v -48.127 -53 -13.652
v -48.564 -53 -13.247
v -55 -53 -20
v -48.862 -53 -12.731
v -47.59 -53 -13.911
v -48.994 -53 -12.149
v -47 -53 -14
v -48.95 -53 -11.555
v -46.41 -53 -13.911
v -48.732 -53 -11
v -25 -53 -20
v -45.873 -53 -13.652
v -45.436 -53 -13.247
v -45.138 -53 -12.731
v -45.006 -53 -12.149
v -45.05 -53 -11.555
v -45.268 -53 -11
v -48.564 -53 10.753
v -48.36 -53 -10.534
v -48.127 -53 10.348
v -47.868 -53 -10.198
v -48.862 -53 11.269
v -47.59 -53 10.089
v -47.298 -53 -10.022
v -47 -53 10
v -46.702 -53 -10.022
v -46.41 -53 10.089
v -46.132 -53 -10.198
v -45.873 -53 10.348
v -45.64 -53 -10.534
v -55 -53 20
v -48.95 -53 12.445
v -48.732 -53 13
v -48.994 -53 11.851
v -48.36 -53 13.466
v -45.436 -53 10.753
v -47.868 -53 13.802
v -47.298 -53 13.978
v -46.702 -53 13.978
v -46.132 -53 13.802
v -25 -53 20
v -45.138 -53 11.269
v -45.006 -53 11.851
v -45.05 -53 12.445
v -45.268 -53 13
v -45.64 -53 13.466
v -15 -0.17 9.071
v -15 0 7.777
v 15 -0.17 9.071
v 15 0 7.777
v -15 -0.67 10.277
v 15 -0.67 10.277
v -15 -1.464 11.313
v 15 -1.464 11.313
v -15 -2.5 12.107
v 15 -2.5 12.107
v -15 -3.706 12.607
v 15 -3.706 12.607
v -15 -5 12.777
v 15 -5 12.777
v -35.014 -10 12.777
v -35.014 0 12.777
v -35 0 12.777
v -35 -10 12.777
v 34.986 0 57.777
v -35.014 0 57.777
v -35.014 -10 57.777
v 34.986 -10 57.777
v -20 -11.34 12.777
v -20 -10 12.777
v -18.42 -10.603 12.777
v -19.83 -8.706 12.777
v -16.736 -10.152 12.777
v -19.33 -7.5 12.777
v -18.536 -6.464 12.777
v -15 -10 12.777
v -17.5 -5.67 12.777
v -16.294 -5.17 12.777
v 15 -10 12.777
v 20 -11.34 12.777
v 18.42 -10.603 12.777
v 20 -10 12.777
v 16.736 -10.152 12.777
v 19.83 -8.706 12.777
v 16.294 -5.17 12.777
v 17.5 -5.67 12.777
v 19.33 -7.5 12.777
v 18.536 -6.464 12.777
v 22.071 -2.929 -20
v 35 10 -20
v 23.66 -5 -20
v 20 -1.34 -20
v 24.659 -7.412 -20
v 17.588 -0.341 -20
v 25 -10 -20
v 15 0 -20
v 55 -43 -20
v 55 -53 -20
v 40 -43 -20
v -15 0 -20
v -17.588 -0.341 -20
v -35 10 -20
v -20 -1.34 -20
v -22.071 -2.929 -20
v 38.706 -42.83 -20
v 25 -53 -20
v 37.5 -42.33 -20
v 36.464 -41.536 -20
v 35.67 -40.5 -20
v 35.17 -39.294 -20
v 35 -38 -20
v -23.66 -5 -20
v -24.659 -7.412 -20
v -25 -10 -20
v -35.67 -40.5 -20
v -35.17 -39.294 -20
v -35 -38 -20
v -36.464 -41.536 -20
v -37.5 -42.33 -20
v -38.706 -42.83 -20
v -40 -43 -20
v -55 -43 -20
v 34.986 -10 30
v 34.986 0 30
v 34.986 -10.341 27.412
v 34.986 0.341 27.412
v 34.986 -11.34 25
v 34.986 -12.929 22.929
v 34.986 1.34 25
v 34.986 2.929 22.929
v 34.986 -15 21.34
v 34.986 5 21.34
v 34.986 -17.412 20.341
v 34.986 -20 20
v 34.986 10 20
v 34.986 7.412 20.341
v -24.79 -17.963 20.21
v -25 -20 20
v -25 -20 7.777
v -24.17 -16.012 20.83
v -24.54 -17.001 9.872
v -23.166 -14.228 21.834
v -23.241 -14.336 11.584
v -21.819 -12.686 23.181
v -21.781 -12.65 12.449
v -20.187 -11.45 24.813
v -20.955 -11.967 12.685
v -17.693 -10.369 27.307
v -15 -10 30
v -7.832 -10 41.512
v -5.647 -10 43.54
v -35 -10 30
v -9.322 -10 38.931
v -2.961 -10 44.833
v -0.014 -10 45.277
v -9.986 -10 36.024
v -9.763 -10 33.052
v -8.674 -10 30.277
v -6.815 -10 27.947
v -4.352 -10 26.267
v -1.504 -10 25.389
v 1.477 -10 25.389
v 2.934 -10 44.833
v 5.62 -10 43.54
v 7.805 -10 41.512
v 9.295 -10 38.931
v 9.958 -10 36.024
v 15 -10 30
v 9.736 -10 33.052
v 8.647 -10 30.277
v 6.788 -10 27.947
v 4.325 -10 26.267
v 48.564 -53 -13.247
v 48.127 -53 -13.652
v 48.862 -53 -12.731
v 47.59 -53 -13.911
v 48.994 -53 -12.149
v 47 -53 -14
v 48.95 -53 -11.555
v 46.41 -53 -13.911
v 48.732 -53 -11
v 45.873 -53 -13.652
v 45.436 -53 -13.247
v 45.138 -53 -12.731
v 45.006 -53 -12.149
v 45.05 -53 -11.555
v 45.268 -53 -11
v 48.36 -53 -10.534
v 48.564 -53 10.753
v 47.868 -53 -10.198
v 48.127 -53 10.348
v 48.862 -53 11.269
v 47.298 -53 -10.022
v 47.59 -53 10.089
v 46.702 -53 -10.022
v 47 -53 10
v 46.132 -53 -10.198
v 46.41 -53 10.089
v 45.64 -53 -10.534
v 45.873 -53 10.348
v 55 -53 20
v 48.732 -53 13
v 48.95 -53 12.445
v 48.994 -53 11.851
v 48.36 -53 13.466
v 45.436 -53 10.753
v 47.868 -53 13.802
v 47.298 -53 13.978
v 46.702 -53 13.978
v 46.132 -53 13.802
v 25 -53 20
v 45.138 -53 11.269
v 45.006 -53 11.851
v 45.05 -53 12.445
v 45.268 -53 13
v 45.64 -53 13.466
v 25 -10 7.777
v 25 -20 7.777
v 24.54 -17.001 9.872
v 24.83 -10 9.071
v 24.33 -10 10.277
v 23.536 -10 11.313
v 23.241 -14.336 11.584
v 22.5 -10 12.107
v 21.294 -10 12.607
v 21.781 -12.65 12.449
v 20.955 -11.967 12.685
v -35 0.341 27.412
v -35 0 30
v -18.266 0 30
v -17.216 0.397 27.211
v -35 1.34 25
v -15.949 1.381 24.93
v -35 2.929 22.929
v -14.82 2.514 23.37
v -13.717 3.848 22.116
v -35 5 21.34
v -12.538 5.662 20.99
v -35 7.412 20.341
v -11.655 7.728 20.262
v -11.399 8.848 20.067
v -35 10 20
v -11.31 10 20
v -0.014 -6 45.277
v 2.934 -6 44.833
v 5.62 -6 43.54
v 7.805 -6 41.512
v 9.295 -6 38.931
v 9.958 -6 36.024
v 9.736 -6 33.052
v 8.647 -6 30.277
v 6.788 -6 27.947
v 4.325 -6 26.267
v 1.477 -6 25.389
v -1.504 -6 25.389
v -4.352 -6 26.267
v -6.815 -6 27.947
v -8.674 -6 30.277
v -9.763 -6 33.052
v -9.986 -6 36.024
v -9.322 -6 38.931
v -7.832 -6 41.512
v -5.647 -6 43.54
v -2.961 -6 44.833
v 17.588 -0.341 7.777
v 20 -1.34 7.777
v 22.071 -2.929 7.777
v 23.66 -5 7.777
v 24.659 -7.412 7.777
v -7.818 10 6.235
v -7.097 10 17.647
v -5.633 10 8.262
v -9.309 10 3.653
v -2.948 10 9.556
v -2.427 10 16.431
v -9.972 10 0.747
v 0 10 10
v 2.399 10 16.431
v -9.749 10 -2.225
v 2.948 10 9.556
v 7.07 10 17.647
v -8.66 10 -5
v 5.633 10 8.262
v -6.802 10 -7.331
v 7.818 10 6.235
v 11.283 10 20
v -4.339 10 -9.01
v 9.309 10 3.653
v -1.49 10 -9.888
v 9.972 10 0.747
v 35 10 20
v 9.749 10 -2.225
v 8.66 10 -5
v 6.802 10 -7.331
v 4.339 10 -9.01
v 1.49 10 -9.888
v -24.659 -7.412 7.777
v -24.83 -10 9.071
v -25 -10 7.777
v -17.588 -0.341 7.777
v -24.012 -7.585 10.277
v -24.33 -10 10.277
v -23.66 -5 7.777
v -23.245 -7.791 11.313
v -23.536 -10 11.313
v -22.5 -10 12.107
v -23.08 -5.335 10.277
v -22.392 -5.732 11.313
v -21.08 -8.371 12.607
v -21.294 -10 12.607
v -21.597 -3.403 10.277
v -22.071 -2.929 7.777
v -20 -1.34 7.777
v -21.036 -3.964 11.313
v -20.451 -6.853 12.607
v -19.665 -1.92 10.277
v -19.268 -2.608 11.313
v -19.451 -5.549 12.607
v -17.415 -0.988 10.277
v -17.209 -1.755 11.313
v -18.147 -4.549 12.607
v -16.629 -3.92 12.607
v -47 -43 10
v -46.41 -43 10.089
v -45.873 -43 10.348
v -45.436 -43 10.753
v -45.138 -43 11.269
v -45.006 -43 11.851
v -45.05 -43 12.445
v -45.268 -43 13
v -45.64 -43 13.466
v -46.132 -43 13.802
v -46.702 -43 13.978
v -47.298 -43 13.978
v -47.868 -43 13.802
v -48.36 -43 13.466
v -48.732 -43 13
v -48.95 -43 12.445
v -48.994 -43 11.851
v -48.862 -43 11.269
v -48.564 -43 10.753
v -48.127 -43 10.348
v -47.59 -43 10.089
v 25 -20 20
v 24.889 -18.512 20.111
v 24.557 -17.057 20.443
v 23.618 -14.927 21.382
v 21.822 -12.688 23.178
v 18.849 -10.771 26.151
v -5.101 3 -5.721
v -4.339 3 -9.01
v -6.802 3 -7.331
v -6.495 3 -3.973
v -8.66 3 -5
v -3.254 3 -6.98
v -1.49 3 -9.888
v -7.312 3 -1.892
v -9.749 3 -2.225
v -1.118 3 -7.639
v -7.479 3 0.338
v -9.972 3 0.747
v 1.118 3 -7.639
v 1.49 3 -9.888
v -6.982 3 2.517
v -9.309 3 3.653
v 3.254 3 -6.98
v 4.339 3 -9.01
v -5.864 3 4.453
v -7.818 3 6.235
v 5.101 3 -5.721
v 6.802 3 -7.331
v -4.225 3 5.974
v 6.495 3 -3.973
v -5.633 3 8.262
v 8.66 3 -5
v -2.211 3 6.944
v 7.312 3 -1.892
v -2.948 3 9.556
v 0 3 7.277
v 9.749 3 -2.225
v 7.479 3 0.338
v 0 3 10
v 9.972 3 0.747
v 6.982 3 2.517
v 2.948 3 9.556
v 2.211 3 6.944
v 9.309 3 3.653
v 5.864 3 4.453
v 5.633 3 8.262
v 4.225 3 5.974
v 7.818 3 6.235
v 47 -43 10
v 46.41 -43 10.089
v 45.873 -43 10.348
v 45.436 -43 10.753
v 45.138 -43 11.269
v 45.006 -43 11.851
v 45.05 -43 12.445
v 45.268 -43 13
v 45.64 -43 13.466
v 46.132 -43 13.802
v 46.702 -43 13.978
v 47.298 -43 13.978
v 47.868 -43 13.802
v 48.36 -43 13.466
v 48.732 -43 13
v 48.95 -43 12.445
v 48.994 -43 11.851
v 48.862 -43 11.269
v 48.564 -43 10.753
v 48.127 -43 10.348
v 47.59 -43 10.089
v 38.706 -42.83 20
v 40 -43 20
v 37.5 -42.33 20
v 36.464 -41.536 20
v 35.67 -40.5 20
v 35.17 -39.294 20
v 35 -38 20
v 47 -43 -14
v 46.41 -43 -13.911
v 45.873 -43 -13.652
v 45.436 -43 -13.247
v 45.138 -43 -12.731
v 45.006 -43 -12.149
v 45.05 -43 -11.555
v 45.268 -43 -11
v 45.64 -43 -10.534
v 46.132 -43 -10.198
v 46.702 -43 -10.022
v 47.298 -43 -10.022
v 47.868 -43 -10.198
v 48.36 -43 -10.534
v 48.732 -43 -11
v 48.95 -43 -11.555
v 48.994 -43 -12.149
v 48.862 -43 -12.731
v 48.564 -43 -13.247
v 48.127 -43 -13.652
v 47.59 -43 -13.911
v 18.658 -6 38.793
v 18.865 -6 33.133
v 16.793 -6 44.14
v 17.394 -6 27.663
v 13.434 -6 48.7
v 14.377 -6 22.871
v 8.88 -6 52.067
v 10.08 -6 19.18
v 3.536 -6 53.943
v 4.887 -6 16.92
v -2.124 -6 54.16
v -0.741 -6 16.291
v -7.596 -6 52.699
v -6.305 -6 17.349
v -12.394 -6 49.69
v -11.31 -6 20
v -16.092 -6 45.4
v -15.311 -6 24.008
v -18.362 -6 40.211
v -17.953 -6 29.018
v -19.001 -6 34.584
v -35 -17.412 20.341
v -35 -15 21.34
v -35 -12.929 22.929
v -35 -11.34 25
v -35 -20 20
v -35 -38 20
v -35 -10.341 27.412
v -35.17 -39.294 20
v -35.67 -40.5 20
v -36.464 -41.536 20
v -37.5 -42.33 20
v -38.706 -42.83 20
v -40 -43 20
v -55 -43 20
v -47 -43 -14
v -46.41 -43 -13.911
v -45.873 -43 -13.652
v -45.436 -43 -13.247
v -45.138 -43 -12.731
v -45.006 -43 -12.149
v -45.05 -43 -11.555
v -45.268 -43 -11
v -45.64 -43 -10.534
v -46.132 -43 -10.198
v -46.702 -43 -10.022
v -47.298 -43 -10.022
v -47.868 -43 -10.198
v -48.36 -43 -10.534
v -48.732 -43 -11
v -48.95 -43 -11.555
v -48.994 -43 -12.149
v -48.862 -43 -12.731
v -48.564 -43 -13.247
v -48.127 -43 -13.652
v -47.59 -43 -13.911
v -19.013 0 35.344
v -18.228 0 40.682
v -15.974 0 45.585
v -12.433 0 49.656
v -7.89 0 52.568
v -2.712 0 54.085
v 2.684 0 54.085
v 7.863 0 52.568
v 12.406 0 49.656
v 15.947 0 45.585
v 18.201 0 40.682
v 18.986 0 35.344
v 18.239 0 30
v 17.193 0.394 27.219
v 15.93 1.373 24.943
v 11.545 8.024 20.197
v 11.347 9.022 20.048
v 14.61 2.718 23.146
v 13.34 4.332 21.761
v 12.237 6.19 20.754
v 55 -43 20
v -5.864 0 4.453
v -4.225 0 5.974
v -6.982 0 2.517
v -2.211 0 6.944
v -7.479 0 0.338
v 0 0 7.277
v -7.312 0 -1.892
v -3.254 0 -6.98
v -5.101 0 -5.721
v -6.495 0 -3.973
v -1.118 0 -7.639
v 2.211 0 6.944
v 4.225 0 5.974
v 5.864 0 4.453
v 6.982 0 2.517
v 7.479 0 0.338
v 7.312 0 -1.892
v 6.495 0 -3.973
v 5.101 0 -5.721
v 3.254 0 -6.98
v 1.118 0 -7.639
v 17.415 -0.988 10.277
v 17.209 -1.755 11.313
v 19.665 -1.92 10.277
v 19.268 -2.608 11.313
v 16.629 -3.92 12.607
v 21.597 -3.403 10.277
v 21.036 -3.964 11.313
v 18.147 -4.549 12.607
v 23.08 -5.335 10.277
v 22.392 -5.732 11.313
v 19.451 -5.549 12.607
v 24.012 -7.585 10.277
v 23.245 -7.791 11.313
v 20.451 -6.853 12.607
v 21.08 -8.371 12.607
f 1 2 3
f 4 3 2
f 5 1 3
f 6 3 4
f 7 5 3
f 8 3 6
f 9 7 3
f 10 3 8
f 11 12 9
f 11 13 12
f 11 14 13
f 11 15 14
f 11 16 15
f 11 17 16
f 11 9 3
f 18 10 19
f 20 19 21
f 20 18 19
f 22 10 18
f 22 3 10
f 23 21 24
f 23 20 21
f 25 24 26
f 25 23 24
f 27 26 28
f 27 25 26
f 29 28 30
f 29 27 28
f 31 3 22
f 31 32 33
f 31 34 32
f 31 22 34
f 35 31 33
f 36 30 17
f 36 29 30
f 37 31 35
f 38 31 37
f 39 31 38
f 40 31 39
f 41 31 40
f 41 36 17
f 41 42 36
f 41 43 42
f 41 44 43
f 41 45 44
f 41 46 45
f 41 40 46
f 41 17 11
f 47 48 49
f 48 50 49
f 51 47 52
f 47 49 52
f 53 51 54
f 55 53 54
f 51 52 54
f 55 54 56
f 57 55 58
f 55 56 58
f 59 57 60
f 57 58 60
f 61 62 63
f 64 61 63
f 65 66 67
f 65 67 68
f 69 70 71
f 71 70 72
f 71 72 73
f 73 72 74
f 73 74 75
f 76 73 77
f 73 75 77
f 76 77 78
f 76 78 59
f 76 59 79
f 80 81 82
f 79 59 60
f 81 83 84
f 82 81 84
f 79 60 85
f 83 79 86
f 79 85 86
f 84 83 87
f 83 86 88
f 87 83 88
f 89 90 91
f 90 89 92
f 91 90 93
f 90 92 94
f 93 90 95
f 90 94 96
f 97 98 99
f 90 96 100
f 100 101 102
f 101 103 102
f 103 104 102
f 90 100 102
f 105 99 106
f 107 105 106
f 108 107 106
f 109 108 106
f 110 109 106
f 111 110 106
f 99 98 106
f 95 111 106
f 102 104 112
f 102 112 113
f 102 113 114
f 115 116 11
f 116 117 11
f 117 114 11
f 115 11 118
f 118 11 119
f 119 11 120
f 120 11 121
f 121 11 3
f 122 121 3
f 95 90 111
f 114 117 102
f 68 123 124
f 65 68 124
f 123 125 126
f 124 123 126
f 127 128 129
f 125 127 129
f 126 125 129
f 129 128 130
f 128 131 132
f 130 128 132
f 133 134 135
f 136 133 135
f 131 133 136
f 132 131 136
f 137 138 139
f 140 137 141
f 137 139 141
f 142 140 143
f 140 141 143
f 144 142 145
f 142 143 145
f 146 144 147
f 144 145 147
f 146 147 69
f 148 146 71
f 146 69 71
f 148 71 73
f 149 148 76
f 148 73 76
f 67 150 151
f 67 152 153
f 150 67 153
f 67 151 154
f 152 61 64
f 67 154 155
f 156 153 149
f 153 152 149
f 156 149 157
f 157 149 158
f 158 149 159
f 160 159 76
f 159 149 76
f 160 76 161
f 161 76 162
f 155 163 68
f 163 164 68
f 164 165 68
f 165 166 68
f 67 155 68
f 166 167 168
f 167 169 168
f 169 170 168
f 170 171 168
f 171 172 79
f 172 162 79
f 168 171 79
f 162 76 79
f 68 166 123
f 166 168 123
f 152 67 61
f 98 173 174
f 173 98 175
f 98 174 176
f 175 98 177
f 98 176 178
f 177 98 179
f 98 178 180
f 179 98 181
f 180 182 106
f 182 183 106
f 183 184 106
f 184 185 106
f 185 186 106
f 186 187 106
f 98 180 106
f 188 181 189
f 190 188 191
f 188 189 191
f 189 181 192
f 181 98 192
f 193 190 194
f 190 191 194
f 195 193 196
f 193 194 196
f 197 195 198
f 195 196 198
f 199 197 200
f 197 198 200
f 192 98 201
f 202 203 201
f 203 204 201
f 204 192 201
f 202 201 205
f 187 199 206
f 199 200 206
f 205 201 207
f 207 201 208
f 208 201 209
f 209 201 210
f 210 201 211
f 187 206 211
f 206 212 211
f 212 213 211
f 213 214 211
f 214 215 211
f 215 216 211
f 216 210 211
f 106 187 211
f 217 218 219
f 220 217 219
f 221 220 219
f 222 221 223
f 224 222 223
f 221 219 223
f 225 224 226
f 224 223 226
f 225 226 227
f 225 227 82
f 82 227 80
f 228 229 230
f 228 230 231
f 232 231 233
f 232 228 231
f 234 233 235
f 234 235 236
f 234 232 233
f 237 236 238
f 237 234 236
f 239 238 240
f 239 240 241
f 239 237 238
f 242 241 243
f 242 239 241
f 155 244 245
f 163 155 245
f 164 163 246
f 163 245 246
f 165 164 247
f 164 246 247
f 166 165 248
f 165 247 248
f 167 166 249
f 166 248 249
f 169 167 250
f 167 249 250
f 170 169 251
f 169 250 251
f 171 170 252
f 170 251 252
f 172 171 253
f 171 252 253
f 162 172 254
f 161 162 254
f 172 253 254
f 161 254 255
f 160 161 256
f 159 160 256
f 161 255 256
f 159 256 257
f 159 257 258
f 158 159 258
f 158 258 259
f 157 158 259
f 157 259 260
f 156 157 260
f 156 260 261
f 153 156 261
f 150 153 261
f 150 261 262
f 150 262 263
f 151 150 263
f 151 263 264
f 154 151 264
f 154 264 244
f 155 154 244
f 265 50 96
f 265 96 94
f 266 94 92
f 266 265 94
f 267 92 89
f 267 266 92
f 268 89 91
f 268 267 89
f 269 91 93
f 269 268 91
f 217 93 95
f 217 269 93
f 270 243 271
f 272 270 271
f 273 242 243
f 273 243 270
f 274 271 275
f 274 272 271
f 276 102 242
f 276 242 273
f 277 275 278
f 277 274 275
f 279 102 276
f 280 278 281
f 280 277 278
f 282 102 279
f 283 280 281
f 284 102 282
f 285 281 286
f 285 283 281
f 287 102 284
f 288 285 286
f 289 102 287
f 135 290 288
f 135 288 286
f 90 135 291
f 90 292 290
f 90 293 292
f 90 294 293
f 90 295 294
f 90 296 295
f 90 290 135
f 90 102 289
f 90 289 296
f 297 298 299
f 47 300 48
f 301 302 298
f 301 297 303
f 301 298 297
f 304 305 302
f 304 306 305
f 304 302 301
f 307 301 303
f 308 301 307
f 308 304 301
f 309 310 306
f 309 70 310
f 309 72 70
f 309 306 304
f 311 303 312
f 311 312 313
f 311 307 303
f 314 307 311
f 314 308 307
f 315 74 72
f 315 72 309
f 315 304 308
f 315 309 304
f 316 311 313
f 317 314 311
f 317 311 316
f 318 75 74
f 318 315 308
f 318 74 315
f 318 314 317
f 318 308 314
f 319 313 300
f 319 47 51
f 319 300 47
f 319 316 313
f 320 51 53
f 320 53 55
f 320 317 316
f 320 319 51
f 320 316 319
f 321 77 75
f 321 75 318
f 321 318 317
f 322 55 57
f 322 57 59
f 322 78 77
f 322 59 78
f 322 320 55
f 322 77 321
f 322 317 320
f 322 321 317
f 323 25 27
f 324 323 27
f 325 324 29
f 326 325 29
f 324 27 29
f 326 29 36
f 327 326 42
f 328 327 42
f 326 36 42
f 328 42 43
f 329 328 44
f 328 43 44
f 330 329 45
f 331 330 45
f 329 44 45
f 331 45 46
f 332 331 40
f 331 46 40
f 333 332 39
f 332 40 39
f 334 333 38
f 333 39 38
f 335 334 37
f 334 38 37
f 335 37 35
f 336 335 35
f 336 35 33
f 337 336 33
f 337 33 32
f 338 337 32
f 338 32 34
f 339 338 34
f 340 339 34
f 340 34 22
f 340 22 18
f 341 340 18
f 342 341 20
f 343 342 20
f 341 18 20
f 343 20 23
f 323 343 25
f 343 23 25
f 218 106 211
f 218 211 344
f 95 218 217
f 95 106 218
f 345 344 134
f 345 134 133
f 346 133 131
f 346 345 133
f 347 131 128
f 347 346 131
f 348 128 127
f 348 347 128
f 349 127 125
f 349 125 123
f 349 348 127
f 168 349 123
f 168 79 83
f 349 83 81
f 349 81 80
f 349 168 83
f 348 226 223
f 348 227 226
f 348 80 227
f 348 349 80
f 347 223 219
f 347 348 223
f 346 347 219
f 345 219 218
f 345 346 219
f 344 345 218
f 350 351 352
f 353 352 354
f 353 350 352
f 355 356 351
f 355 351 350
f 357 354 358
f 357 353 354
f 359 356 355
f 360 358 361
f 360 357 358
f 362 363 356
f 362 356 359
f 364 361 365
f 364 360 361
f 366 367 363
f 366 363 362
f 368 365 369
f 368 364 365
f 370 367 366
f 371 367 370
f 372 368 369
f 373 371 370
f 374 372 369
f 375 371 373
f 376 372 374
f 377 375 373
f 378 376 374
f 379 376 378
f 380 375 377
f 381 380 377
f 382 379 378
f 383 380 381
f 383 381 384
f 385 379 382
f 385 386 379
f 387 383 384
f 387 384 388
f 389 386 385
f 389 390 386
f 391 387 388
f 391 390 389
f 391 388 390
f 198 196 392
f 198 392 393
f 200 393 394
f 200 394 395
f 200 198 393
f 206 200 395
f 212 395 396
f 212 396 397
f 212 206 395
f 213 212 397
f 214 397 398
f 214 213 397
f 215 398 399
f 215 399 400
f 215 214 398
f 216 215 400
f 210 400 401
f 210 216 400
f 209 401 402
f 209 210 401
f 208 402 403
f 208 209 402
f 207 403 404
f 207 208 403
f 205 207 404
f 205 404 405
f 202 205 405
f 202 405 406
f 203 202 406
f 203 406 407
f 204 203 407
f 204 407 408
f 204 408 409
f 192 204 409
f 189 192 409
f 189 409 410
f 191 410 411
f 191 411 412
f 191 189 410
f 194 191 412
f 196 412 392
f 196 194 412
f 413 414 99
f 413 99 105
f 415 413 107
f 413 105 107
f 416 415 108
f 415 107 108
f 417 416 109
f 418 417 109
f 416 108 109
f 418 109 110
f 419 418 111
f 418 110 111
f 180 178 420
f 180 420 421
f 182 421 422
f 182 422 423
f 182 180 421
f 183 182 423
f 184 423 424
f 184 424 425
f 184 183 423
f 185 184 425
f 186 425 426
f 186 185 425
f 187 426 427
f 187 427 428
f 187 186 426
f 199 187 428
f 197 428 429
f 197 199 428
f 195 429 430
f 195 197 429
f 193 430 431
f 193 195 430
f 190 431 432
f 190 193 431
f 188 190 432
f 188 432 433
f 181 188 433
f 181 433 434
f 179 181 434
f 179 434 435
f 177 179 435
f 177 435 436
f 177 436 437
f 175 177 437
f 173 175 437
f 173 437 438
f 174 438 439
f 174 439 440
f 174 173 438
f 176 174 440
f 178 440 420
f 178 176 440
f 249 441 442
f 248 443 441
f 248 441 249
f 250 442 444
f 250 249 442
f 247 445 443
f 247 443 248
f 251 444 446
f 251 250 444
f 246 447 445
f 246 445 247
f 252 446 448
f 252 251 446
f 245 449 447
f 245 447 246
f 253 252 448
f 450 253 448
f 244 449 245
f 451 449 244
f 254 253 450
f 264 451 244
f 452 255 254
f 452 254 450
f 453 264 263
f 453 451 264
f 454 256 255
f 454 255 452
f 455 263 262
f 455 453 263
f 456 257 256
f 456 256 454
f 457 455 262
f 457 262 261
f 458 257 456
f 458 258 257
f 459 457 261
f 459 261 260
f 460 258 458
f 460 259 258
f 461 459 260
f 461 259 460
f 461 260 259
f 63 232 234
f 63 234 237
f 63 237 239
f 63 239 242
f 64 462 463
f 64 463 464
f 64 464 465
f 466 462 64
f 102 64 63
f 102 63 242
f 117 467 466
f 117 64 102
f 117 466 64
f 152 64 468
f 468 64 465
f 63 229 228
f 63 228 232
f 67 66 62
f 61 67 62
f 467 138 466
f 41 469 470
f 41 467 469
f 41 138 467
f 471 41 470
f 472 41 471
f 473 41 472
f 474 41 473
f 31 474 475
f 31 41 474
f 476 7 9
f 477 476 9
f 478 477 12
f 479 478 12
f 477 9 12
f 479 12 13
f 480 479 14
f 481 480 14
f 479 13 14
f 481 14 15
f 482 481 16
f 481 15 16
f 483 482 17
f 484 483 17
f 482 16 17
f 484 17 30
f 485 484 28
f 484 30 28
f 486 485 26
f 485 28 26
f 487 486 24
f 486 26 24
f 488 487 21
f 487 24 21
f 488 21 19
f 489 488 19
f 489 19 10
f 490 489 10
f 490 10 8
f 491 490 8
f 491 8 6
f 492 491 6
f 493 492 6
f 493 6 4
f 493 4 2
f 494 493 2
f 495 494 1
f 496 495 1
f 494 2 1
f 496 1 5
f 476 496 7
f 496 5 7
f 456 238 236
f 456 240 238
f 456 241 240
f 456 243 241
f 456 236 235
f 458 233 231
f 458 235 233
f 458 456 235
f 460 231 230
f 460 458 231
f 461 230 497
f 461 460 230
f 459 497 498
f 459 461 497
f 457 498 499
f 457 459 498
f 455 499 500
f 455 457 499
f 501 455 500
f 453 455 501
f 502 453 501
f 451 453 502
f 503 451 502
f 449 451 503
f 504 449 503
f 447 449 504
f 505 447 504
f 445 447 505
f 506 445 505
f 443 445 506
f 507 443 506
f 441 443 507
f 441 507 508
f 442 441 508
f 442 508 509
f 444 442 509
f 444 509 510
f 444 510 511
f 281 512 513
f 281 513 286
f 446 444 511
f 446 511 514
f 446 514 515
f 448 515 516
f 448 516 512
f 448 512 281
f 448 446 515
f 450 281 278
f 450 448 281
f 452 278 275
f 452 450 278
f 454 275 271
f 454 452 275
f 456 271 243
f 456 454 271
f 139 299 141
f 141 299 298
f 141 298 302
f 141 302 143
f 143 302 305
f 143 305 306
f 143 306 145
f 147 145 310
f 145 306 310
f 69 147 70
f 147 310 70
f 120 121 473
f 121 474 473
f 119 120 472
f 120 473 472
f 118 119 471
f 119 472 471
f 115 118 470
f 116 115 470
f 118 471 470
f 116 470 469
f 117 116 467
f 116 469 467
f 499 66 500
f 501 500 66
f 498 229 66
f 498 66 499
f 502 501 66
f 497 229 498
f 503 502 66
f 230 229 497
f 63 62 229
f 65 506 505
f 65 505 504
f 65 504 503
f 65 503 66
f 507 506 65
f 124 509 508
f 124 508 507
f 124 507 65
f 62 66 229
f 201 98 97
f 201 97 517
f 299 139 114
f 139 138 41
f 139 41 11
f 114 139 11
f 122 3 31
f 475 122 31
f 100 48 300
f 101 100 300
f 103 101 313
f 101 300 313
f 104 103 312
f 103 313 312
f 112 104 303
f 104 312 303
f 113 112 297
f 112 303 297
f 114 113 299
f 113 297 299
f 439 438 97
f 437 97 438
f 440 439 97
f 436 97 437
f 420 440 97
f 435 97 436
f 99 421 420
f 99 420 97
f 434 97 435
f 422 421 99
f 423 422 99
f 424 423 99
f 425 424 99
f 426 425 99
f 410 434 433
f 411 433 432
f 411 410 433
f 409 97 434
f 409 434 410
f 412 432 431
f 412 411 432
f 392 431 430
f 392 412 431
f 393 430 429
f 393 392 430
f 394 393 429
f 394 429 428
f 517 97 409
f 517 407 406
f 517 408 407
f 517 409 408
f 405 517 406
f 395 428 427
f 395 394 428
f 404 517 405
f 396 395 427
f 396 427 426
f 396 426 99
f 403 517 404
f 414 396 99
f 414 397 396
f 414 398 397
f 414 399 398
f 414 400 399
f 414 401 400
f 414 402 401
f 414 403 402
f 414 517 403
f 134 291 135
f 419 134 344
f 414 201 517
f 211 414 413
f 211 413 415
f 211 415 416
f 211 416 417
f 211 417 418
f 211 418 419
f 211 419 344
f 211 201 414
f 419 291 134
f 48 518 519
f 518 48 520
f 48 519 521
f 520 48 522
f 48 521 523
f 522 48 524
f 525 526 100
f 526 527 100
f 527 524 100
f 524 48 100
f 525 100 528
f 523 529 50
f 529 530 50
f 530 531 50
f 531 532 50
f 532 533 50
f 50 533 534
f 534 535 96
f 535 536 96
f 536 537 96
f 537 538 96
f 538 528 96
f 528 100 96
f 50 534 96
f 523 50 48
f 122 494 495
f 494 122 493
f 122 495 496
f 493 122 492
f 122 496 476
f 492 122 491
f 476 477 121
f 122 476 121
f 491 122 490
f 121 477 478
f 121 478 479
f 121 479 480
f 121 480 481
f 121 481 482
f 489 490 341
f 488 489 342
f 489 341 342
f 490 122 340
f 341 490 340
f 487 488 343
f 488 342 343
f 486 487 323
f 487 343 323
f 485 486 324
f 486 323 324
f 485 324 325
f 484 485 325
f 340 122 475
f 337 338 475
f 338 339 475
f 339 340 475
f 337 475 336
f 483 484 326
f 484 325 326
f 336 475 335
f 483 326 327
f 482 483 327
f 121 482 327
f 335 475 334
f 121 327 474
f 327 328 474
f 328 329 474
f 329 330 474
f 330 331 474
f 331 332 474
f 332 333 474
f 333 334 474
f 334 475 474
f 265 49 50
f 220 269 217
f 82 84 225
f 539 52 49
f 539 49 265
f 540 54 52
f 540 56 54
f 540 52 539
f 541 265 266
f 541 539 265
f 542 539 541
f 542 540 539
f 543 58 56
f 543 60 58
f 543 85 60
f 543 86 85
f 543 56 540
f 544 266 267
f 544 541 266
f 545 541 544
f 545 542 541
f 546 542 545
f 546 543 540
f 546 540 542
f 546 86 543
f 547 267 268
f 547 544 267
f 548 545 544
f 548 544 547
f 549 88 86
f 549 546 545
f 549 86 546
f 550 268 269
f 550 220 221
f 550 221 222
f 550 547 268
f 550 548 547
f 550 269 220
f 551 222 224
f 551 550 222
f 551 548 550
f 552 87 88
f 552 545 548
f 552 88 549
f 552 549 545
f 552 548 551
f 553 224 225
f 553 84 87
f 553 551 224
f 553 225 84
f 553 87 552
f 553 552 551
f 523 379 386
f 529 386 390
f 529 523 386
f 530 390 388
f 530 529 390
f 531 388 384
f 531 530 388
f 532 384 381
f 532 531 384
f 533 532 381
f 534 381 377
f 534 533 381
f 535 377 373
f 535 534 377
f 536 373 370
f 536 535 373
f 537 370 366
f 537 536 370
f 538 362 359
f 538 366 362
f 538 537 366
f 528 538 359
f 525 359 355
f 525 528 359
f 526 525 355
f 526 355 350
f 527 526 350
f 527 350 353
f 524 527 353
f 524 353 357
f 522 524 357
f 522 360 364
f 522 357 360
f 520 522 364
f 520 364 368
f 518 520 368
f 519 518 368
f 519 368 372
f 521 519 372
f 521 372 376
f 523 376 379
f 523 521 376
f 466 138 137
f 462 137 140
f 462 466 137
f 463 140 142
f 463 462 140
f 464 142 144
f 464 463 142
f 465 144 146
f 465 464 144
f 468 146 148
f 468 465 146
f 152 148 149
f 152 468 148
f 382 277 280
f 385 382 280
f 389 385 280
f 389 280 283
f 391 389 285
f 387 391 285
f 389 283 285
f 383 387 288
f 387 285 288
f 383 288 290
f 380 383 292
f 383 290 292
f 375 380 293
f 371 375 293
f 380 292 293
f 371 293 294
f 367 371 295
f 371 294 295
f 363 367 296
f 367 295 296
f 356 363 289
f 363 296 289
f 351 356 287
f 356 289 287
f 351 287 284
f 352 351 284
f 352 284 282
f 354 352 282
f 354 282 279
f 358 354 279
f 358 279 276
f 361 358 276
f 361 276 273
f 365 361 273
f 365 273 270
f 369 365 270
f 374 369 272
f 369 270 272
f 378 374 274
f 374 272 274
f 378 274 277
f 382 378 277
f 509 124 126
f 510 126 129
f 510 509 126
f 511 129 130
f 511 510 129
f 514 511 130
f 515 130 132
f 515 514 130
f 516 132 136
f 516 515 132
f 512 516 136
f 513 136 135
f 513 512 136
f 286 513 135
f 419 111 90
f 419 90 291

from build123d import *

# Parameters (mm, degrees)
SKETCH1_W               = 70
SKETCH1_H               = 40
SKETCH1_R               = 7.5
BOSS_EXTRUDE2_DEPTH     = 10
SKETCH2_R               = 10
CUT_EXTRUDE1_DEPTH      = 7
SKETCH3_W               = 10
SKETCH3_H               = 40
BOSS_EXTRUDE3_DEPTH     = 53
SKETCH5_W               = 30
SKETCH5_H               = 40
BOSS_EXTRUDE4_DEPTH     = 10
SKETCH7_R               = 2
CUT_EXTRUDE2_DEPTH      = 10
FILLET5_R               = 5
FILLET6_R               = 5
SKETCH10_W              = 70
SKETCH10_H              = 45
SKETCH10_R              = 10
BOSS_EXTRUDE9_DEPTH     = 10
CUT_EXTRUDE3_DEPTH      = 96.771597908
CUT_EXTRUDE3_DEPTH_BACK = 6
SKETCH11_R              = 19
FILLET7_R               = 10
FILLET8_R               = 10
FILLET9_R               = 5


with BuildPart() as part:
    # Sketch1 → Boss-Extrude2 (new body)
    with BuildSketch(Plane(origin=(0, 0, 0), x_dir=(1, 0, 0), z_dir=(0, 1, 0))):
        Rectangle(SKETCH1_W, SKETCH1_H)
        with Locations(Location((0, 0.222850833, 0), (0, 0, 270))):
            Circle(SKETCH1_R, mode=Mode.SUBTRACT)
    extrude(amount=BOSS_EXTRUDE2_DEPTH)

    # Sketch2 → Cut-Extrude1 (cut)
    with BuildSketch(Plane(origin=(0, 10, 0), x_dir=(1, 0, 0), z_dir=(0, 1, 0))):
        with Locations(Location((0, 0, 0), (0, 0, 270))):
            Circle(SKETCH2_R)
    extrude(amount=-CUT_EXTRUDE1_DEPTH, mode=Mode.SUBTRACT)

    # Sketch3 → Boss-Extrude3 (add)
    with BuildSketch(Plane.XZ):
        with Locations((-30, 0)):
            Rectangle(SKETCH3_W, SKETCH3_H)
    boss_extrude3 = extrude(amount=BOSS_EXTRUDE3_DEPTH)

    # Sketch5 → Boss-Extrude4 (add)
    with BuildSketch(Plane.XZ.offset(53)):
        with Locations((-40, 0)):
            Rectangle(SKETCH5_W, SKETCH5_H)
    boss_extrude4 = extrude(amount=-BOSS_EXTRUDE4_DEPTH)

    # Sketch7 → Cut-Extrude2 (cut)
    with BuildSketch(Plane.XZ.offset(53)):
        with Locations(Location((-47, 12, 0), (0, 0, 270))):
            Circle(SKETCH7_R)
        with Locations(Location((-47, -12, 0), (0, 0, 270))):
            Circle(SKETCH7_R)
    cut_extrude2 = extrude(amount=-CUT_EXTRUDE2_DEPTH, mode=Mode.SUBTRACT)

    # Fillet5
    fillet5_edges = [part.edges().sort_by_distance(p)[0] for p in [
        (-35, -43, 0),
    ]]
    fillet(fillet5_edges, radius=FILLET5_R)

    # Mirror10: Boss-Extrude3, Boss-Extrude4, Cut-Extrude2 across plane
    add(boss_extrude3.mirror(Plane(origin=(0, 0, 0), x_dir=(0, 0, 1), z_dir=(1, 0, 0))))
    add(boss_extrude4.mirror(Plane(origin=(0, 0, 0), x_dir=(0, 0, 1), z_dir=(1, 0, 0))))
    add(cut_extrude2.mirror(Plane(origin=(0, 0, 0), x_dir=(0, 0, 1), z_dir=(1, 0, 0))), mode=Mode.SUBTRACT)

    # Fillet6
    fillet6_edges = [part.edges().sort_by_distance(p)[0] for p in [
        (35, -43, 0),
    ]]
    fillet(fillet6_edges, radius=FILLET6_R)

    # Sketch10 → Boss-Extrude9 (add)
    with BuildSketch(Plane(origin=(0, 0, 0), x_dir=(1, 0, 0), z_dir=(0, 1, 0))):
        with Locations((-0.013568797, -35.277149167)):
            Rectangle(SKETCH10_W, SKETCH10_H)
        with Locations(Location((-0.013568797, -35.277149167, 0), (0, 0, 270))):
            Circle(SKETCH10_R, mode=Mode.SUBTRACT)
    extrude(amount=-BOSS_EXTRUDE9_DEPTH)

    # Sketch11 → Cut-Extrude3 (cut, two sides: drawn at the far end of the back side and taken through both)
    with BuildSketch(Plane(origin=(0, 0, 0), x_dir=(1, 0, 0), z_dir=(0, 1, 0)).offset(-CUT_EXTRUDE3_DEPTH_BACK)):
        with Locations(Location((-0.013568797, -35.277149167, 0), (0, 0, 126.480381765))):
            Circle(SKETCH11_R)
    extrude(amount=CUT_EXTRUDE3_DEPTH + CUT_EXTRUDE3_DEPTH_BACK, mode=Mode.SUBTRACT)

    # Fillet7
    # the kernel refuses this fillet: 10 mm, written as the material it adds along each edge
    with BuildSketch(Plane(origin=(-35, -10, 20), x_dir=(0, 0, 1), z_dir=(1, 0, 0))) as fillet7_piece_1:
        with BuildLine():
            CenterArc((FILLET7_R, FILLET7_R), FILLET7_R, 180, 90)
            Line((0, FILLET7_R), (0, 0))
            Line((0, 0), (FILLET7_R, 0))
        make_face()
    extrude(amount=10)
    with BuildSketch(Plane(origin=(25, -10, 20), x_dir=(0, -1, 0), z_dir=(1, 0, 0))) as fillet7_piece_2:
        with BuildLine():
            CenterArc((FILLET7_R, -FILLET7_R), FILLET7_R, 90, 90)
            Line((0, -FILLET7_R), (0, 0))
            Line((0, 0), (FILLET7_R, 0))
        make_face()
    extrude(amount=9.986431203)
    with BuildSketch(Plane(origin=(-13.717166125, 0, 20), x_dir=(0, 1, 0), z_dir=(1, 0, 0))) as fillet7_piece_3_section:
        with BuildLine():
            CenterArc((FILLET7_R, FILLET7_R), FILLET7_R, 180, 90)
            Line((0, FILLET7_R), (0, 0))
            Line((0, 0), (FILLET7_R, 0))
        make_face()
    fillet7_piece_3 = extrude(amount=48.703597328, mode=Mode.PRIVATE)
    fillet7_piece_3 = fillet7_piece_3 - Plane(origin=(-0.013568797, 3.73467358, 35.277149167), x_dir=(-0.5945475090531093, 0, -0.8040604824755057), z_dir=(0, -1, 0)) * Cylinder(19, 138, mode=Mode.PRIVATE)
    add(fillet7_piece_3)
    with BuildSketch(Plane(origin=(-35, 0, 20), x_dir=(0, 0, 1), z_dir=(1, 0, 0))) as fillet7_piece_4_section:
        with BuildLine():
            CenterArc((FILLET7_R, -FILLET7_R), FILLET7_R, 90, 90)
            Line((0, -FILLET7_R), (0, 0))
            Line((0, 0), (FILLET7_R, 0))
        make_face()
    fillet7_piece_4 = extrude(amount=48.690028531, mode=Mode.PRIVATE)
    fillet7_piece_4 = fillet7_piece_4 - Plane(origin=(-0.013568797, 2.378365403, 35.277149167), x_dir=(-0.5945475090531093, 0, -0.8040604824755057), z_dir=(0, -1, 0)) * Cylinder(19, 138, mode=Mode.PRIVATE)
    add(fillet7_piece_4)

    # Fillet8
    fillet8_edges = [part.edges().sort_by_distance(p)[0] for p in [
        (25, 0, -3.611425416),
        (-25, 0, -3.611425416),
        (-25, -10, 21.388574584),
        (25, -10, 21.388574584),
    ]]
    fillet(fillet8_edges, radius=FILLET8_R)

    # Fillet9
    fillet9_edges = [part.edges().sort_by_distance(p)[0] for p in [
        (0, 0, 12.777149167),
        (-22.071067812, -2.928932188, 12.777149167),
        (22.071067812, -2.928932188, 12.777149167),
        (25, -15, 12.777149167),
        (-25, -15, 12.777149167),
    ]]
    fillet(fillet9_edges, radius=FILLET9_R)


solid = part.part
